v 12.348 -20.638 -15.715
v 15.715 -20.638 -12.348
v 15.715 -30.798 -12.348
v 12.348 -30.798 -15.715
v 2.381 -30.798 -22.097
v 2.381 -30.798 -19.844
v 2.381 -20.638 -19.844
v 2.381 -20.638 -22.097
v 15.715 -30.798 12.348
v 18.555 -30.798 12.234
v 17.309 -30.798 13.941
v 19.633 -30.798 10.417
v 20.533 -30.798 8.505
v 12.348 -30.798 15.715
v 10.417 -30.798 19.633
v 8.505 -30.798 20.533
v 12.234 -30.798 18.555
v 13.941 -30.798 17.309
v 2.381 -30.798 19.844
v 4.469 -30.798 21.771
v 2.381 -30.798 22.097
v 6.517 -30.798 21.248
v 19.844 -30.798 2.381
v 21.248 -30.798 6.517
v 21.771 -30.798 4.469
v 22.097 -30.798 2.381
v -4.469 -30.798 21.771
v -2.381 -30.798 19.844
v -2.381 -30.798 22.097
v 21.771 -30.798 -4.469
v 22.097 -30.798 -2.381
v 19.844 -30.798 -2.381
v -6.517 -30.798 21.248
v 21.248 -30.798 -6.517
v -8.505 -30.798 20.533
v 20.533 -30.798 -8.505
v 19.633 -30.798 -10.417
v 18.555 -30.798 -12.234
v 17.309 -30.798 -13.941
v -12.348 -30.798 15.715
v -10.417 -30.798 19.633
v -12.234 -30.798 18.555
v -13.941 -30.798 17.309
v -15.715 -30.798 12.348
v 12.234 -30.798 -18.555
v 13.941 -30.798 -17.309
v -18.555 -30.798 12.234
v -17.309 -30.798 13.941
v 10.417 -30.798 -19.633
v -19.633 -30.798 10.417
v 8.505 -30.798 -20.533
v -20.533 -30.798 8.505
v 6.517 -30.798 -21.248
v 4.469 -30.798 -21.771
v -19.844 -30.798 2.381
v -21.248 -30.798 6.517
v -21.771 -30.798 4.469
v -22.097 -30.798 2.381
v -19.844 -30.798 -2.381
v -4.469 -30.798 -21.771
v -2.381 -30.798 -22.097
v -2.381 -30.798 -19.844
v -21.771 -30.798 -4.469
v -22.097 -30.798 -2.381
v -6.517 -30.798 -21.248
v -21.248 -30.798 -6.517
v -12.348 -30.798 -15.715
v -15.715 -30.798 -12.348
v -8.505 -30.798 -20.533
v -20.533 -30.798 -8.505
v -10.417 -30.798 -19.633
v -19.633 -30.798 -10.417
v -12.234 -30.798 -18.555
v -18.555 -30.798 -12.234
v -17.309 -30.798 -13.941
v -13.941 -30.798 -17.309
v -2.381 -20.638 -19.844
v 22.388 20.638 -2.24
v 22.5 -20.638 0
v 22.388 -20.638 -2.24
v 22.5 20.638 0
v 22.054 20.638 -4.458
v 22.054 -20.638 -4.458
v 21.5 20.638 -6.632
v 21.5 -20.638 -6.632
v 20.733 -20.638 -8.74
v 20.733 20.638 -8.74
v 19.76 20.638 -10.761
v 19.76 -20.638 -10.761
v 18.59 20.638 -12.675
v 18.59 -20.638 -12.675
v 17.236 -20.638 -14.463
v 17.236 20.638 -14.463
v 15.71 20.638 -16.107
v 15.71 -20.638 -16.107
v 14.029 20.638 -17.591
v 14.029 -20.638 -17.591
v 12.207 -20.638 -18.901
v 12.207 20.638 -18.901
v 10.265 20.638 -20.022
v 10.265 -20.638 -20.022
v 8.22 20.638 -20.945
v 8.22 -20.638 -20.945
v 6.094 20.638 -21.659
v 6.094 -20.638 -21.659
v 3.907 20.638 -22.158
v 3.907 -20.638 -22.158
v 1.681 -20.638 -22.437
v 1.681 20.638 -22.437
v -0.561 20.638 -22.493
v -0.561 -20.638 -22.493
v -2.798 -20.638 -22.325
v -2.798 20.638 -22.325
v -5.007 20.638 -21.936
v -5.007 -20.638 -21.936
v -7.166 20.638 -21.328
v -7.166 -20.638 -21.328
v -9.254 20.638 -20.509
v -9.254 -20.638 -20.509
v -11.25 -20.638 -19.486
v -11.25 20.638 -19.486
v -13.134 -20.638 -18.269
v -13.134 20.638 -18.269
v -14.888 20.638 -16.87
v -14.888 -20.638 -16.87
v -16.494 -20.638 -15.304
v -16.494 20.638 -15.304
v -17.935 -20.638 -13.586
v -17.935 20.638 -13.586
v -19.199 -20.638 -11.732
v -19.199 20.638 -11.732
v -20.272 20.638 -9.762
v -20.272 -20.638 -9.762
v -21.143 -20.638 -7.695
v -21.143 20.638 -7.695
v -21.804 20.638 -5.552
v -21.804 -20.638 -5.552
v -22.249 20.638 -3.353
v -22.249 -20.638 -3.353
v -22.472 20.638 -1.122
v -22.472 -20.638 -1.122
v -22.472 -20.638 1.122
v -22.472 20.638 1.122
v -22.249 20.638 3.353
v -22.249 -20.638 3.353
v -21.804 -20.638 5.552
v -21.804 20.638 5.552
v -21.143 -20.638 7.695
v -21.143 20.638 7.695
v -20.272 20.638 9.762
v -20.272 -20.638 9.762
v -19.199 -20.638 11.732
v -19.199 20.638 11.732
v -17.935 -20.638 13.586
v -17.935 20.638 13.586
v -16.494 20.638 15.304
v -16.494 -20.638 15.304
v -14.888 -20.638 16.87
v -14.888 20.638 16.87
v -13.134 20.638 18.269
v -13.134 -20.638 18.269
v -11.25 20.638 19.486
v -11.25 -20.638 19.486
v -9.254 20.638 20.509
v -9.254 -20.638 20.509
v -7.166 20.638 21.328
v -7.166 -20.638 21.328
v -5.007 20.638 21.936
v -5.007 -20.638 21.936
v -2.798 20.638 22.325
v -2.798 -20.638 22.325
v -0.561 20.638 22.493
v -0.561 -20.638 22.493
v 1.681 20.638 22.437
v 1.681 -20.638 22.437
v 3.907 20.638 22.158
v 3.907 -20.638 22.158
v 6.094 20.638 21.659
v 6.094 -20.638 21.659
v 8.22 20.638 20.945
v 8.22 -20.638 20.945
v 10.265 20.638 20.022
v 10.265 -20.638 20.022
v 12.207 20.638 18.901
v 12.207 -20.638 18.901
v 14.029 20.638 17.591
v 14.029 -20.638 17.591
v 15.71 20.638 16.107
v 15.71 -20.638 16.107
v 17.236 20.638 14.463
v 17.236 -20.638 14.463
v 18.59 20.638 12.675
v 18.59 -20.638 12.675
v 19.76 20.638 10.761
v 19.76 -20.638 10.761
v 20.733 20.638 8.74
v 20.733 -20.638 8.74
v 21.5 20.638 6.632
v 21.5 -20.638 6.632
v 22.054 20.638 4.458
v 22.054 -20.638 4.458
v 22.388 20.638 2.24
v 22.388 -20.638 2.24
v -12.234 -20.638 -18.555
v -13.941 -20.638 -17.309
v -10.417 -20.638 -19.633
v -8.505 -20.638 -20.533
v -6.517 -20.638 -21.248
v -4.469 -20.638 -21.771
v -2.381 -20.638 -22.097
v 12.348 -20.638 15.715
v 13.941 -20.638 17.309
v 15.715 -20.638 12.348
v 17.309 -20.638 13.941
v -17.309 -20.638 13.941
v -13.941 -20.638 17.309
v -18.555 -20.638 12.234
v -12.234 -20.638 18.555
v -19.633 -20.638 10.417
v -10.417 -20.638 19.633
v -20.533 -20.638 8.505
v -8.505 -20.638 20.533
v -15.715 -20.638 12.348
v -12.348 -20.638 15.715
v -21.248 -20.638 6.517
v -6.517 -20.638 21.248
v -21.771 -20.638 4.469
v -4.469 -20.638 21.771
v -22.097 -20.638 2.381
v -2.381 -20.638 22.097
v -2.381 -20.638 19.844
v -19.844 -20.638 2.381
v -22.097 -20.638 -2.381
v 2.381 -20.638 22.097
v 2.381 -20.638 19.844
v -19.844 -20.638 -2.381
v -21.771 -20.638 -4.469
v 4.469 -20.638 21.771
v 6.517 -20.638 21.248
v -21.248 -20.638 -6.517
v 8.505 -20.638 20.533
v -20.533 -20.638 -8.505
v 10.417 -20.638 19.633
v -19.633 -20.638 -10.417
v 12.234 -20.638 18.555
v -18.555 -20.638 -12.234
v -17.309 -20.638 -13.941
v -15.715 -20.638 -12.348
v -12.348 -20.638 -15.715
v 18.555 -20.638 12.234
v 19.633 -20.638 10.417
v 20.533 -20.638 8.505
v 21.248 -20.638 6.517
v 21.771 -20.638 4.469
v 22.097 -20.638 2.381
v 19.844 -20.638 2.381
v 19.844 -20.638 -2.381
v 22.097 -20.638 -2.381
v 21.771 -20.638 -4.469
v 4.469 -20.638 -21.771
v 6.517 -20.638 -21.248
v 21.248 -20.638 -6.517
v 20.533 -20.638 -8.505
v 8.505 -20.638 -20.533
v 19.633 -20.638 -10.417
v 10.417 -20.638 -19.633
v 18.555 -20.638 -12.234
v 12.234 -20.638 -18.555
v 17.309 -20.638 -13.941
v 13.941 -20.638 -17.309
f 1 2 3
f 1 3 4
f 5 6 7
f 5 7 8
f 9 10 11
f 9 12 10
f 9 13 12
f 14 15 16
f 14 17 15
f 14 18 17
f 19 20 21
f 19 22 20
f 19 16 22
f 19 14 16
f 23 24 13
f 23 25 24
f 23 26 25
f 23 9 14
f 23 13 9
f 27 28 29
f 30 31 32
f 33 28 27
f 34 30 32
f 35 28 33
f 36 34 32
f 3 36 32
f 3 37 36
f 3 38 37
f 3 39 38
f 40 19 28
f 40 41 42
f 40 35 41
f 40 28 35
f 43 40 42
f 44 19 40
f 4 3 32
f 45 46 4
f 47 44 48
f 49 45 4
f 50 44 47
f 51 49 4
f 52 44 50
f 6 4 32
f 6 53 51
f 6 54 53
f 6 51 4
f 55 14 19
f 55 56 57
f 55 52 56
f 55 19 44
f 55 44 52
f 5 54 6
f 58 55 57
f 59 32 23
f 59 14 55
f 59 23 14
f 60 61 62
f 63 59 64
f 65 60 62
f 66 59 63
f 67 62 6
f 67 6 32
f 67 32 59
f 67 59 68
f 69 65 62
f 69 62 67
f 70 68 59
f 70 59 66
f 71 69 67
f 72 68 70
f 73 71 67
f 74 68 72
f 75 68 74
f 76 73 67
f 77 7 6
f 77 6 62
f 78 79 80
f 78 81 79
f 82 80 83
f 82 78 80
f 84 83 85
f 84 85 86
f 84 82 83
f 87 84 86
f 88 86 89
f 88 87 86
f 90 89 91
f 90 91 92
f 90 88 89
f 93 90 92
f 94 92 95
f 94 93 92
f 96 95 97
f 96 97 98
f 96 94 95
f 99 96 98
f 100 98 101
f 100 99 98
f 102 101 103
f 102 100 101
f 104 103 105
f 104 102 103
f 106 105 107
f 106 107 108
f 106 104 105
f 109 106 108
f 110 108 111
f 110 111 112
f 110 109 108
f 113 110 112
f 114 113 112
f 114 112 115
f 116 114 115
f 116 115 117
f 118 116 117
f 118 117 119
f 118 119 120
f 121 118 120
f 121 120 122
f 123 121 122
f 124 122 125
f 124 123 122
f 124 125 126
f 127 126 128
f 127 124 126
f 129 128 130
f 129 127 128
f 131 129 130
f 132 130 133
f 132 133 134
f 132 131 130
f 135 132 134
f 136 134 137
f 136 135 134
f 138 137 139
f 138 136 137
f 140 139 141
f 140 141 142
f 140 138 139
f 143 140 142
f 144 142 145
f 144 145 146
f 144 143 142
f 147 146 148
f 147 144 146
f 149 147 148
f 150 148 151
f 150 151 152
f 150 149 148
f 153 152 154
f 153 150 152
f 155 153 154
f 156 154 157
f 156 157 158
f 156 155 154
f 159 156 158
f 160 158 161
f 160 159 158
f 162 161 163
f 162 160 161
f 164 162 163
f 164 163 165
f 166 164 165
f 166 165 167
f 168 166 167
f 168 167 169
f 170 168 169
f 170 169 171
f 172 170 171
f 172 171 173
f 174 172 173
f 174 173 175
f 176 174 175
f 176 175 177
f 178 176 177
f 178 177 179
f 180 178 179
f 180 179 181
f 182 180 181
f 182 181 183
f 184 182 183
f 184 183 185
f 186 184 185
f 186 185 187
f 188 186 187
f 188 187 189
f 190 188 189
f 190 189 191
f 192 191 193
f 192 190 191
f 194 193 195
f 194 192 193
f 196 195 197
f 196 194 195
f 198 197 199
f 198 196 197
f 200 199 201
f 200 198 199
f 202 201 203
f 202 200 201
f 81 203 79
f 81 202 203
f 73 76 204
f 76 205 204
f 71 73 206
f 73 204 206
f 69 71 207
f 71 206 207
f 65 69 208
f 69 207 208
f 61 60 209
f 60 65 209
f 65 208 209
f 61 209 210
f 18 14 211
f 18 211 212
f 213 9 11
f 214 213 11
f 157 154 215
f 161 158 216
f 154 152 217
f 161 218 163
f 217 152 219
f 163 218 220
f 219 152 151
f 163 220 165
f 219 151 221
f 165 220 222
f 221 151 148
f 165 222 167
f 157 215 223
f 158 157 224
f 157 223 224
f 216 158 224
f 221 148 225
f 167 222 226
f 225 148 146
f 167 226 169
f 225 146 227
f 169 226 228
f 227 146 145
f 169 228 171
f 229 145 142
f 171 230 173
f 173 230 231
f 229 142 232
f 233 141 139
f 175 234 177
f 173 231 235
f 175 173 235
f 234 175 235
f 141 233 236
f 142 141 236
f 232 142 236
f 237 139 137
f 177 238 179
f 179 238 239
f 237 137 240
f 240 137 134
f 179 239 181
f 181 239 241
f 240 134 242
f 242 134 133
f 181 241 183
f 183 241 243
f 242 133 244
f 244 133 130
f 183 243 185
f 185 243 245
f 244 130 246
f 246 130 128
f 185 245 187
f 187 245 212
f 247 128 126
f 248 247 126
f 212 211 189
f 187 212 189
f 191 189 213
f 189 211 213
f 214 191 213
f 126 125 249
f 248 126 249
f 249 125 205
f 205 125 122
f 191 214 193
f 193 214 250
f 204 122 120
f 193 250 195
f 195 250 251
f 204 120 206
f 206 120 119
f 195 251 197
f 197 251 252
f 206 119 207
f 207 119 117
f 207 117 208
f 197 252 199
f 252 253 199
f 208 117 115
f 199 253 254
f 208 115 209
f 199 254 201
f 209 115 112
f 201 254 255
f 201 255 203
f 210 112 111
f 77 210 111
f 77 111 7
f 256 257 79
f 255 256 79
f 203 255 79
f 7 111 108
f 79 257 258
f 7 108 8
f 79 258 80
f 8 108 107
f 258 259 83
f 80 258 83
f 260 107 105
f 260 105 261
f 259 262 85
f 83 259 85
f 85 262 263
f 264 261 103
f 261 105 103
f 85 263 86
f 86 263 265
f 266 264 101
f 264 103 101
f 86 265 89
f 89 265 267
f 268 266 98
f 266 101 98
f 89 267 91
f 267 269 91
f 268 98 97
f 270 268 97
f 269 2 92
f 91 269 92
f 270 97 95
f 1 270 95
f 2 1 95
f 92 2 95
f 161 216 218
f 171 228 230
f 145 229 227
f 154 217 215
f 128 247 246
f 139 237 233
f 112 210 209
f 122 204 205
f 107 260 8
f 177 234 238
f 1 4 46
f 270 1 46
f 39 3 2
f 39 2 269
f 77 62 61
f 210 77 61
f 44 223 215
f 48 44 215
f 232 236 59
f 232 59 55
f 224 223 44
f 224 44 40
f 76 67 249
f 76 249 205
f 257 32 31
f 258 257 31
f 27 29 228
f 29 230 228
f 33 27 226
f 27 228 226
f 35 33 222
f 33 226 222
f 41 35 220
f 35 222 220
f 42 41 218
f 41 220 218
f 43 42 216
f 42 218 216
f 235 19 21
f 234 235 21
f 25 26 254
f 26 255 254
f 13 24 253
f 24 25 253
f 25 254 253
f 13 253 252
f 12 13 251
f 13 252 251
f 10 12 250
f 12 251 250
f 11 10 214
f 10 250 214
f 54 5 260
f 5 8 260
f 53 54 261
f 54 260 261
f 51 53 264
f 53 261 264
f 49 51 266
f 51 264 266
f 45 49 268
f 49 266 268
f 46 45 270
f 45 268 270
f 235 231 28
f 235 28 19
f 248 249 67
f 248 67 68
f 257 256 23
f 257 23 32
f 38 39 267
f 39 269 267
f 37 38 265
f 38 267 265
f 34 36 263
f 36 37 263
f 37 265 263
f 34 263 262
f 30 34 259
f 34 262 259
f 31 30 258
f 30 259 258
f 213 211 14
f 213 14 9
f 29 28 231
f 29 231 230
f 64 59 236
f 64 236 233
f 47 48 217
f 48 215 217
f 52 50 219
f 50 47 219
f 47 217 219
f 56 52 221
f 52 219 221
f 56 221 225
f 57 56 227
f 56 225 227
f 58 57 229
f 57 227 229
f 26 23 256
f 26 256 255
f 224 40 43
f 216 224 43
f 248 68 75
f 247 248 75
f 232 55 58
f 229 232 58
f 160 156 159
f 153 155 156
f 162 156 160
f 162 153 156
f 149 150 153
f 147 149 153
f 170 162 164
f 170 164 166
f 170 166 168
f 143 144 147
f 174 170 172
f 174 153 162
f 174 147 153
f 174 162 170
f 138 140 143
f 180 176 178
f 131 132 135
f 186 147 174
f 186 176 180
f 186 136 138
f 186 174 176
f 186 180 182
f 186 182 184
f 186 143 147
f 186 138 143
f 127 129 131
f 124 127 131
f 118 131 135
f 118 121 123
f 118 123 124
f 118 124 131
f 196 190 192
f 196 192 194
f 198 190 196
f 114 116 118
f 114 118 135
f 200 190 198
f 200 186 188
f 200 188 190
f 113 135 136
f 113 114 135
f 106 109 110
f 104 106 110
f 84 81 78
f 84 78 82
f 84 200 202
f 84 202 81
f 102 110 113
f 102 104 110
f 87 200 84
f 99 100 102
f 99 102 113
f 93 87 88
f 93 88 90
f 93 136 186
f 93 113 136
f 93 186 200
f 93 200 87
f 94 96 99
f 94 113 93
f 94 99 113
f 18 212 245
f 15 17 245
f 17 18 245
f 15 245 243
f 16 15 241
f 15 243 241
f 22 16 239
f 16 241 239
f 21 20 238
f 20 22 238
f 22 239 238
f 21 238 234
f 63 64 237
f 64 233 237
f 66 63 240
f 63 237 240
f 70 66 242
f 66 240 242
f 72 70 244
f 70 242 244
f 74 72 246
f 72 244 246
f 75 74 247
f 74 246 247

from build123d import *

# Parameters (mm, degrees)
SKETCH1_R           = 22.5
BOSS_EXTRUDE1_DEPTH = 20.6375
SKETCH3_R           = 22.225
BOSS_EXTRUDE2_DEPTH = 10.16
SKETCH4_W           = 4.7625
SKETCH4_H           = 4.7625
CUT_EXTRUDE2_DEPTH  = 10.16
CIRPATTERN2_COUNT   = 8


with BuildPart() as part:
    # Sketch1 → Boss-Extrude1 (new body, symmetric)
    with BuildSketch(Plane(origin=(0, 0, 0), x_dir=(1, 0, 0), z_dir=(0, 1, 0))):
        Circle(SKETCH1_R)
    extrude(amount=BOSS_EXTRUDE1_DEPTH, both=True)

    # Sketch3 → Boss-Extrude2 (add)
    with BuildSketch(Plane(origin=(0, -20.6375, 0), x_dir=(-1, 0, 0), z_dir=(0, -1, 0))):
        Circle(SKETCH3_R)
    extrude(amount=BOSS_EXTRUDE2_DEPTH)

    # Sketch4 → Cut-Extrude2 (cut)
    with BuildSketch(Plane.XZ.offset(30.7975)):
        with Locations((0, 22.225)):
            Rectangle(SKETCH4_W, SKETCH4_H)
    cut_extrude2 = extrude(amount=-CUT_EXTRUDE2_DEPTH, mode=Mode.SUBTRACT)

    # CirPattern2: Cut-Extrude2 ×8 about axis
    cirpattern2_axis = Axis((0, 0, 0), (0, 1, 0))
    for i in range(1, CIRPATTERN2_COUNT):
        add(cut_extrude2.rotate(cirpattern2_axis, i * 360 / CIRPATTERN2_COUNT), mode=Mode.SUBTRACT)


solid = part.part
